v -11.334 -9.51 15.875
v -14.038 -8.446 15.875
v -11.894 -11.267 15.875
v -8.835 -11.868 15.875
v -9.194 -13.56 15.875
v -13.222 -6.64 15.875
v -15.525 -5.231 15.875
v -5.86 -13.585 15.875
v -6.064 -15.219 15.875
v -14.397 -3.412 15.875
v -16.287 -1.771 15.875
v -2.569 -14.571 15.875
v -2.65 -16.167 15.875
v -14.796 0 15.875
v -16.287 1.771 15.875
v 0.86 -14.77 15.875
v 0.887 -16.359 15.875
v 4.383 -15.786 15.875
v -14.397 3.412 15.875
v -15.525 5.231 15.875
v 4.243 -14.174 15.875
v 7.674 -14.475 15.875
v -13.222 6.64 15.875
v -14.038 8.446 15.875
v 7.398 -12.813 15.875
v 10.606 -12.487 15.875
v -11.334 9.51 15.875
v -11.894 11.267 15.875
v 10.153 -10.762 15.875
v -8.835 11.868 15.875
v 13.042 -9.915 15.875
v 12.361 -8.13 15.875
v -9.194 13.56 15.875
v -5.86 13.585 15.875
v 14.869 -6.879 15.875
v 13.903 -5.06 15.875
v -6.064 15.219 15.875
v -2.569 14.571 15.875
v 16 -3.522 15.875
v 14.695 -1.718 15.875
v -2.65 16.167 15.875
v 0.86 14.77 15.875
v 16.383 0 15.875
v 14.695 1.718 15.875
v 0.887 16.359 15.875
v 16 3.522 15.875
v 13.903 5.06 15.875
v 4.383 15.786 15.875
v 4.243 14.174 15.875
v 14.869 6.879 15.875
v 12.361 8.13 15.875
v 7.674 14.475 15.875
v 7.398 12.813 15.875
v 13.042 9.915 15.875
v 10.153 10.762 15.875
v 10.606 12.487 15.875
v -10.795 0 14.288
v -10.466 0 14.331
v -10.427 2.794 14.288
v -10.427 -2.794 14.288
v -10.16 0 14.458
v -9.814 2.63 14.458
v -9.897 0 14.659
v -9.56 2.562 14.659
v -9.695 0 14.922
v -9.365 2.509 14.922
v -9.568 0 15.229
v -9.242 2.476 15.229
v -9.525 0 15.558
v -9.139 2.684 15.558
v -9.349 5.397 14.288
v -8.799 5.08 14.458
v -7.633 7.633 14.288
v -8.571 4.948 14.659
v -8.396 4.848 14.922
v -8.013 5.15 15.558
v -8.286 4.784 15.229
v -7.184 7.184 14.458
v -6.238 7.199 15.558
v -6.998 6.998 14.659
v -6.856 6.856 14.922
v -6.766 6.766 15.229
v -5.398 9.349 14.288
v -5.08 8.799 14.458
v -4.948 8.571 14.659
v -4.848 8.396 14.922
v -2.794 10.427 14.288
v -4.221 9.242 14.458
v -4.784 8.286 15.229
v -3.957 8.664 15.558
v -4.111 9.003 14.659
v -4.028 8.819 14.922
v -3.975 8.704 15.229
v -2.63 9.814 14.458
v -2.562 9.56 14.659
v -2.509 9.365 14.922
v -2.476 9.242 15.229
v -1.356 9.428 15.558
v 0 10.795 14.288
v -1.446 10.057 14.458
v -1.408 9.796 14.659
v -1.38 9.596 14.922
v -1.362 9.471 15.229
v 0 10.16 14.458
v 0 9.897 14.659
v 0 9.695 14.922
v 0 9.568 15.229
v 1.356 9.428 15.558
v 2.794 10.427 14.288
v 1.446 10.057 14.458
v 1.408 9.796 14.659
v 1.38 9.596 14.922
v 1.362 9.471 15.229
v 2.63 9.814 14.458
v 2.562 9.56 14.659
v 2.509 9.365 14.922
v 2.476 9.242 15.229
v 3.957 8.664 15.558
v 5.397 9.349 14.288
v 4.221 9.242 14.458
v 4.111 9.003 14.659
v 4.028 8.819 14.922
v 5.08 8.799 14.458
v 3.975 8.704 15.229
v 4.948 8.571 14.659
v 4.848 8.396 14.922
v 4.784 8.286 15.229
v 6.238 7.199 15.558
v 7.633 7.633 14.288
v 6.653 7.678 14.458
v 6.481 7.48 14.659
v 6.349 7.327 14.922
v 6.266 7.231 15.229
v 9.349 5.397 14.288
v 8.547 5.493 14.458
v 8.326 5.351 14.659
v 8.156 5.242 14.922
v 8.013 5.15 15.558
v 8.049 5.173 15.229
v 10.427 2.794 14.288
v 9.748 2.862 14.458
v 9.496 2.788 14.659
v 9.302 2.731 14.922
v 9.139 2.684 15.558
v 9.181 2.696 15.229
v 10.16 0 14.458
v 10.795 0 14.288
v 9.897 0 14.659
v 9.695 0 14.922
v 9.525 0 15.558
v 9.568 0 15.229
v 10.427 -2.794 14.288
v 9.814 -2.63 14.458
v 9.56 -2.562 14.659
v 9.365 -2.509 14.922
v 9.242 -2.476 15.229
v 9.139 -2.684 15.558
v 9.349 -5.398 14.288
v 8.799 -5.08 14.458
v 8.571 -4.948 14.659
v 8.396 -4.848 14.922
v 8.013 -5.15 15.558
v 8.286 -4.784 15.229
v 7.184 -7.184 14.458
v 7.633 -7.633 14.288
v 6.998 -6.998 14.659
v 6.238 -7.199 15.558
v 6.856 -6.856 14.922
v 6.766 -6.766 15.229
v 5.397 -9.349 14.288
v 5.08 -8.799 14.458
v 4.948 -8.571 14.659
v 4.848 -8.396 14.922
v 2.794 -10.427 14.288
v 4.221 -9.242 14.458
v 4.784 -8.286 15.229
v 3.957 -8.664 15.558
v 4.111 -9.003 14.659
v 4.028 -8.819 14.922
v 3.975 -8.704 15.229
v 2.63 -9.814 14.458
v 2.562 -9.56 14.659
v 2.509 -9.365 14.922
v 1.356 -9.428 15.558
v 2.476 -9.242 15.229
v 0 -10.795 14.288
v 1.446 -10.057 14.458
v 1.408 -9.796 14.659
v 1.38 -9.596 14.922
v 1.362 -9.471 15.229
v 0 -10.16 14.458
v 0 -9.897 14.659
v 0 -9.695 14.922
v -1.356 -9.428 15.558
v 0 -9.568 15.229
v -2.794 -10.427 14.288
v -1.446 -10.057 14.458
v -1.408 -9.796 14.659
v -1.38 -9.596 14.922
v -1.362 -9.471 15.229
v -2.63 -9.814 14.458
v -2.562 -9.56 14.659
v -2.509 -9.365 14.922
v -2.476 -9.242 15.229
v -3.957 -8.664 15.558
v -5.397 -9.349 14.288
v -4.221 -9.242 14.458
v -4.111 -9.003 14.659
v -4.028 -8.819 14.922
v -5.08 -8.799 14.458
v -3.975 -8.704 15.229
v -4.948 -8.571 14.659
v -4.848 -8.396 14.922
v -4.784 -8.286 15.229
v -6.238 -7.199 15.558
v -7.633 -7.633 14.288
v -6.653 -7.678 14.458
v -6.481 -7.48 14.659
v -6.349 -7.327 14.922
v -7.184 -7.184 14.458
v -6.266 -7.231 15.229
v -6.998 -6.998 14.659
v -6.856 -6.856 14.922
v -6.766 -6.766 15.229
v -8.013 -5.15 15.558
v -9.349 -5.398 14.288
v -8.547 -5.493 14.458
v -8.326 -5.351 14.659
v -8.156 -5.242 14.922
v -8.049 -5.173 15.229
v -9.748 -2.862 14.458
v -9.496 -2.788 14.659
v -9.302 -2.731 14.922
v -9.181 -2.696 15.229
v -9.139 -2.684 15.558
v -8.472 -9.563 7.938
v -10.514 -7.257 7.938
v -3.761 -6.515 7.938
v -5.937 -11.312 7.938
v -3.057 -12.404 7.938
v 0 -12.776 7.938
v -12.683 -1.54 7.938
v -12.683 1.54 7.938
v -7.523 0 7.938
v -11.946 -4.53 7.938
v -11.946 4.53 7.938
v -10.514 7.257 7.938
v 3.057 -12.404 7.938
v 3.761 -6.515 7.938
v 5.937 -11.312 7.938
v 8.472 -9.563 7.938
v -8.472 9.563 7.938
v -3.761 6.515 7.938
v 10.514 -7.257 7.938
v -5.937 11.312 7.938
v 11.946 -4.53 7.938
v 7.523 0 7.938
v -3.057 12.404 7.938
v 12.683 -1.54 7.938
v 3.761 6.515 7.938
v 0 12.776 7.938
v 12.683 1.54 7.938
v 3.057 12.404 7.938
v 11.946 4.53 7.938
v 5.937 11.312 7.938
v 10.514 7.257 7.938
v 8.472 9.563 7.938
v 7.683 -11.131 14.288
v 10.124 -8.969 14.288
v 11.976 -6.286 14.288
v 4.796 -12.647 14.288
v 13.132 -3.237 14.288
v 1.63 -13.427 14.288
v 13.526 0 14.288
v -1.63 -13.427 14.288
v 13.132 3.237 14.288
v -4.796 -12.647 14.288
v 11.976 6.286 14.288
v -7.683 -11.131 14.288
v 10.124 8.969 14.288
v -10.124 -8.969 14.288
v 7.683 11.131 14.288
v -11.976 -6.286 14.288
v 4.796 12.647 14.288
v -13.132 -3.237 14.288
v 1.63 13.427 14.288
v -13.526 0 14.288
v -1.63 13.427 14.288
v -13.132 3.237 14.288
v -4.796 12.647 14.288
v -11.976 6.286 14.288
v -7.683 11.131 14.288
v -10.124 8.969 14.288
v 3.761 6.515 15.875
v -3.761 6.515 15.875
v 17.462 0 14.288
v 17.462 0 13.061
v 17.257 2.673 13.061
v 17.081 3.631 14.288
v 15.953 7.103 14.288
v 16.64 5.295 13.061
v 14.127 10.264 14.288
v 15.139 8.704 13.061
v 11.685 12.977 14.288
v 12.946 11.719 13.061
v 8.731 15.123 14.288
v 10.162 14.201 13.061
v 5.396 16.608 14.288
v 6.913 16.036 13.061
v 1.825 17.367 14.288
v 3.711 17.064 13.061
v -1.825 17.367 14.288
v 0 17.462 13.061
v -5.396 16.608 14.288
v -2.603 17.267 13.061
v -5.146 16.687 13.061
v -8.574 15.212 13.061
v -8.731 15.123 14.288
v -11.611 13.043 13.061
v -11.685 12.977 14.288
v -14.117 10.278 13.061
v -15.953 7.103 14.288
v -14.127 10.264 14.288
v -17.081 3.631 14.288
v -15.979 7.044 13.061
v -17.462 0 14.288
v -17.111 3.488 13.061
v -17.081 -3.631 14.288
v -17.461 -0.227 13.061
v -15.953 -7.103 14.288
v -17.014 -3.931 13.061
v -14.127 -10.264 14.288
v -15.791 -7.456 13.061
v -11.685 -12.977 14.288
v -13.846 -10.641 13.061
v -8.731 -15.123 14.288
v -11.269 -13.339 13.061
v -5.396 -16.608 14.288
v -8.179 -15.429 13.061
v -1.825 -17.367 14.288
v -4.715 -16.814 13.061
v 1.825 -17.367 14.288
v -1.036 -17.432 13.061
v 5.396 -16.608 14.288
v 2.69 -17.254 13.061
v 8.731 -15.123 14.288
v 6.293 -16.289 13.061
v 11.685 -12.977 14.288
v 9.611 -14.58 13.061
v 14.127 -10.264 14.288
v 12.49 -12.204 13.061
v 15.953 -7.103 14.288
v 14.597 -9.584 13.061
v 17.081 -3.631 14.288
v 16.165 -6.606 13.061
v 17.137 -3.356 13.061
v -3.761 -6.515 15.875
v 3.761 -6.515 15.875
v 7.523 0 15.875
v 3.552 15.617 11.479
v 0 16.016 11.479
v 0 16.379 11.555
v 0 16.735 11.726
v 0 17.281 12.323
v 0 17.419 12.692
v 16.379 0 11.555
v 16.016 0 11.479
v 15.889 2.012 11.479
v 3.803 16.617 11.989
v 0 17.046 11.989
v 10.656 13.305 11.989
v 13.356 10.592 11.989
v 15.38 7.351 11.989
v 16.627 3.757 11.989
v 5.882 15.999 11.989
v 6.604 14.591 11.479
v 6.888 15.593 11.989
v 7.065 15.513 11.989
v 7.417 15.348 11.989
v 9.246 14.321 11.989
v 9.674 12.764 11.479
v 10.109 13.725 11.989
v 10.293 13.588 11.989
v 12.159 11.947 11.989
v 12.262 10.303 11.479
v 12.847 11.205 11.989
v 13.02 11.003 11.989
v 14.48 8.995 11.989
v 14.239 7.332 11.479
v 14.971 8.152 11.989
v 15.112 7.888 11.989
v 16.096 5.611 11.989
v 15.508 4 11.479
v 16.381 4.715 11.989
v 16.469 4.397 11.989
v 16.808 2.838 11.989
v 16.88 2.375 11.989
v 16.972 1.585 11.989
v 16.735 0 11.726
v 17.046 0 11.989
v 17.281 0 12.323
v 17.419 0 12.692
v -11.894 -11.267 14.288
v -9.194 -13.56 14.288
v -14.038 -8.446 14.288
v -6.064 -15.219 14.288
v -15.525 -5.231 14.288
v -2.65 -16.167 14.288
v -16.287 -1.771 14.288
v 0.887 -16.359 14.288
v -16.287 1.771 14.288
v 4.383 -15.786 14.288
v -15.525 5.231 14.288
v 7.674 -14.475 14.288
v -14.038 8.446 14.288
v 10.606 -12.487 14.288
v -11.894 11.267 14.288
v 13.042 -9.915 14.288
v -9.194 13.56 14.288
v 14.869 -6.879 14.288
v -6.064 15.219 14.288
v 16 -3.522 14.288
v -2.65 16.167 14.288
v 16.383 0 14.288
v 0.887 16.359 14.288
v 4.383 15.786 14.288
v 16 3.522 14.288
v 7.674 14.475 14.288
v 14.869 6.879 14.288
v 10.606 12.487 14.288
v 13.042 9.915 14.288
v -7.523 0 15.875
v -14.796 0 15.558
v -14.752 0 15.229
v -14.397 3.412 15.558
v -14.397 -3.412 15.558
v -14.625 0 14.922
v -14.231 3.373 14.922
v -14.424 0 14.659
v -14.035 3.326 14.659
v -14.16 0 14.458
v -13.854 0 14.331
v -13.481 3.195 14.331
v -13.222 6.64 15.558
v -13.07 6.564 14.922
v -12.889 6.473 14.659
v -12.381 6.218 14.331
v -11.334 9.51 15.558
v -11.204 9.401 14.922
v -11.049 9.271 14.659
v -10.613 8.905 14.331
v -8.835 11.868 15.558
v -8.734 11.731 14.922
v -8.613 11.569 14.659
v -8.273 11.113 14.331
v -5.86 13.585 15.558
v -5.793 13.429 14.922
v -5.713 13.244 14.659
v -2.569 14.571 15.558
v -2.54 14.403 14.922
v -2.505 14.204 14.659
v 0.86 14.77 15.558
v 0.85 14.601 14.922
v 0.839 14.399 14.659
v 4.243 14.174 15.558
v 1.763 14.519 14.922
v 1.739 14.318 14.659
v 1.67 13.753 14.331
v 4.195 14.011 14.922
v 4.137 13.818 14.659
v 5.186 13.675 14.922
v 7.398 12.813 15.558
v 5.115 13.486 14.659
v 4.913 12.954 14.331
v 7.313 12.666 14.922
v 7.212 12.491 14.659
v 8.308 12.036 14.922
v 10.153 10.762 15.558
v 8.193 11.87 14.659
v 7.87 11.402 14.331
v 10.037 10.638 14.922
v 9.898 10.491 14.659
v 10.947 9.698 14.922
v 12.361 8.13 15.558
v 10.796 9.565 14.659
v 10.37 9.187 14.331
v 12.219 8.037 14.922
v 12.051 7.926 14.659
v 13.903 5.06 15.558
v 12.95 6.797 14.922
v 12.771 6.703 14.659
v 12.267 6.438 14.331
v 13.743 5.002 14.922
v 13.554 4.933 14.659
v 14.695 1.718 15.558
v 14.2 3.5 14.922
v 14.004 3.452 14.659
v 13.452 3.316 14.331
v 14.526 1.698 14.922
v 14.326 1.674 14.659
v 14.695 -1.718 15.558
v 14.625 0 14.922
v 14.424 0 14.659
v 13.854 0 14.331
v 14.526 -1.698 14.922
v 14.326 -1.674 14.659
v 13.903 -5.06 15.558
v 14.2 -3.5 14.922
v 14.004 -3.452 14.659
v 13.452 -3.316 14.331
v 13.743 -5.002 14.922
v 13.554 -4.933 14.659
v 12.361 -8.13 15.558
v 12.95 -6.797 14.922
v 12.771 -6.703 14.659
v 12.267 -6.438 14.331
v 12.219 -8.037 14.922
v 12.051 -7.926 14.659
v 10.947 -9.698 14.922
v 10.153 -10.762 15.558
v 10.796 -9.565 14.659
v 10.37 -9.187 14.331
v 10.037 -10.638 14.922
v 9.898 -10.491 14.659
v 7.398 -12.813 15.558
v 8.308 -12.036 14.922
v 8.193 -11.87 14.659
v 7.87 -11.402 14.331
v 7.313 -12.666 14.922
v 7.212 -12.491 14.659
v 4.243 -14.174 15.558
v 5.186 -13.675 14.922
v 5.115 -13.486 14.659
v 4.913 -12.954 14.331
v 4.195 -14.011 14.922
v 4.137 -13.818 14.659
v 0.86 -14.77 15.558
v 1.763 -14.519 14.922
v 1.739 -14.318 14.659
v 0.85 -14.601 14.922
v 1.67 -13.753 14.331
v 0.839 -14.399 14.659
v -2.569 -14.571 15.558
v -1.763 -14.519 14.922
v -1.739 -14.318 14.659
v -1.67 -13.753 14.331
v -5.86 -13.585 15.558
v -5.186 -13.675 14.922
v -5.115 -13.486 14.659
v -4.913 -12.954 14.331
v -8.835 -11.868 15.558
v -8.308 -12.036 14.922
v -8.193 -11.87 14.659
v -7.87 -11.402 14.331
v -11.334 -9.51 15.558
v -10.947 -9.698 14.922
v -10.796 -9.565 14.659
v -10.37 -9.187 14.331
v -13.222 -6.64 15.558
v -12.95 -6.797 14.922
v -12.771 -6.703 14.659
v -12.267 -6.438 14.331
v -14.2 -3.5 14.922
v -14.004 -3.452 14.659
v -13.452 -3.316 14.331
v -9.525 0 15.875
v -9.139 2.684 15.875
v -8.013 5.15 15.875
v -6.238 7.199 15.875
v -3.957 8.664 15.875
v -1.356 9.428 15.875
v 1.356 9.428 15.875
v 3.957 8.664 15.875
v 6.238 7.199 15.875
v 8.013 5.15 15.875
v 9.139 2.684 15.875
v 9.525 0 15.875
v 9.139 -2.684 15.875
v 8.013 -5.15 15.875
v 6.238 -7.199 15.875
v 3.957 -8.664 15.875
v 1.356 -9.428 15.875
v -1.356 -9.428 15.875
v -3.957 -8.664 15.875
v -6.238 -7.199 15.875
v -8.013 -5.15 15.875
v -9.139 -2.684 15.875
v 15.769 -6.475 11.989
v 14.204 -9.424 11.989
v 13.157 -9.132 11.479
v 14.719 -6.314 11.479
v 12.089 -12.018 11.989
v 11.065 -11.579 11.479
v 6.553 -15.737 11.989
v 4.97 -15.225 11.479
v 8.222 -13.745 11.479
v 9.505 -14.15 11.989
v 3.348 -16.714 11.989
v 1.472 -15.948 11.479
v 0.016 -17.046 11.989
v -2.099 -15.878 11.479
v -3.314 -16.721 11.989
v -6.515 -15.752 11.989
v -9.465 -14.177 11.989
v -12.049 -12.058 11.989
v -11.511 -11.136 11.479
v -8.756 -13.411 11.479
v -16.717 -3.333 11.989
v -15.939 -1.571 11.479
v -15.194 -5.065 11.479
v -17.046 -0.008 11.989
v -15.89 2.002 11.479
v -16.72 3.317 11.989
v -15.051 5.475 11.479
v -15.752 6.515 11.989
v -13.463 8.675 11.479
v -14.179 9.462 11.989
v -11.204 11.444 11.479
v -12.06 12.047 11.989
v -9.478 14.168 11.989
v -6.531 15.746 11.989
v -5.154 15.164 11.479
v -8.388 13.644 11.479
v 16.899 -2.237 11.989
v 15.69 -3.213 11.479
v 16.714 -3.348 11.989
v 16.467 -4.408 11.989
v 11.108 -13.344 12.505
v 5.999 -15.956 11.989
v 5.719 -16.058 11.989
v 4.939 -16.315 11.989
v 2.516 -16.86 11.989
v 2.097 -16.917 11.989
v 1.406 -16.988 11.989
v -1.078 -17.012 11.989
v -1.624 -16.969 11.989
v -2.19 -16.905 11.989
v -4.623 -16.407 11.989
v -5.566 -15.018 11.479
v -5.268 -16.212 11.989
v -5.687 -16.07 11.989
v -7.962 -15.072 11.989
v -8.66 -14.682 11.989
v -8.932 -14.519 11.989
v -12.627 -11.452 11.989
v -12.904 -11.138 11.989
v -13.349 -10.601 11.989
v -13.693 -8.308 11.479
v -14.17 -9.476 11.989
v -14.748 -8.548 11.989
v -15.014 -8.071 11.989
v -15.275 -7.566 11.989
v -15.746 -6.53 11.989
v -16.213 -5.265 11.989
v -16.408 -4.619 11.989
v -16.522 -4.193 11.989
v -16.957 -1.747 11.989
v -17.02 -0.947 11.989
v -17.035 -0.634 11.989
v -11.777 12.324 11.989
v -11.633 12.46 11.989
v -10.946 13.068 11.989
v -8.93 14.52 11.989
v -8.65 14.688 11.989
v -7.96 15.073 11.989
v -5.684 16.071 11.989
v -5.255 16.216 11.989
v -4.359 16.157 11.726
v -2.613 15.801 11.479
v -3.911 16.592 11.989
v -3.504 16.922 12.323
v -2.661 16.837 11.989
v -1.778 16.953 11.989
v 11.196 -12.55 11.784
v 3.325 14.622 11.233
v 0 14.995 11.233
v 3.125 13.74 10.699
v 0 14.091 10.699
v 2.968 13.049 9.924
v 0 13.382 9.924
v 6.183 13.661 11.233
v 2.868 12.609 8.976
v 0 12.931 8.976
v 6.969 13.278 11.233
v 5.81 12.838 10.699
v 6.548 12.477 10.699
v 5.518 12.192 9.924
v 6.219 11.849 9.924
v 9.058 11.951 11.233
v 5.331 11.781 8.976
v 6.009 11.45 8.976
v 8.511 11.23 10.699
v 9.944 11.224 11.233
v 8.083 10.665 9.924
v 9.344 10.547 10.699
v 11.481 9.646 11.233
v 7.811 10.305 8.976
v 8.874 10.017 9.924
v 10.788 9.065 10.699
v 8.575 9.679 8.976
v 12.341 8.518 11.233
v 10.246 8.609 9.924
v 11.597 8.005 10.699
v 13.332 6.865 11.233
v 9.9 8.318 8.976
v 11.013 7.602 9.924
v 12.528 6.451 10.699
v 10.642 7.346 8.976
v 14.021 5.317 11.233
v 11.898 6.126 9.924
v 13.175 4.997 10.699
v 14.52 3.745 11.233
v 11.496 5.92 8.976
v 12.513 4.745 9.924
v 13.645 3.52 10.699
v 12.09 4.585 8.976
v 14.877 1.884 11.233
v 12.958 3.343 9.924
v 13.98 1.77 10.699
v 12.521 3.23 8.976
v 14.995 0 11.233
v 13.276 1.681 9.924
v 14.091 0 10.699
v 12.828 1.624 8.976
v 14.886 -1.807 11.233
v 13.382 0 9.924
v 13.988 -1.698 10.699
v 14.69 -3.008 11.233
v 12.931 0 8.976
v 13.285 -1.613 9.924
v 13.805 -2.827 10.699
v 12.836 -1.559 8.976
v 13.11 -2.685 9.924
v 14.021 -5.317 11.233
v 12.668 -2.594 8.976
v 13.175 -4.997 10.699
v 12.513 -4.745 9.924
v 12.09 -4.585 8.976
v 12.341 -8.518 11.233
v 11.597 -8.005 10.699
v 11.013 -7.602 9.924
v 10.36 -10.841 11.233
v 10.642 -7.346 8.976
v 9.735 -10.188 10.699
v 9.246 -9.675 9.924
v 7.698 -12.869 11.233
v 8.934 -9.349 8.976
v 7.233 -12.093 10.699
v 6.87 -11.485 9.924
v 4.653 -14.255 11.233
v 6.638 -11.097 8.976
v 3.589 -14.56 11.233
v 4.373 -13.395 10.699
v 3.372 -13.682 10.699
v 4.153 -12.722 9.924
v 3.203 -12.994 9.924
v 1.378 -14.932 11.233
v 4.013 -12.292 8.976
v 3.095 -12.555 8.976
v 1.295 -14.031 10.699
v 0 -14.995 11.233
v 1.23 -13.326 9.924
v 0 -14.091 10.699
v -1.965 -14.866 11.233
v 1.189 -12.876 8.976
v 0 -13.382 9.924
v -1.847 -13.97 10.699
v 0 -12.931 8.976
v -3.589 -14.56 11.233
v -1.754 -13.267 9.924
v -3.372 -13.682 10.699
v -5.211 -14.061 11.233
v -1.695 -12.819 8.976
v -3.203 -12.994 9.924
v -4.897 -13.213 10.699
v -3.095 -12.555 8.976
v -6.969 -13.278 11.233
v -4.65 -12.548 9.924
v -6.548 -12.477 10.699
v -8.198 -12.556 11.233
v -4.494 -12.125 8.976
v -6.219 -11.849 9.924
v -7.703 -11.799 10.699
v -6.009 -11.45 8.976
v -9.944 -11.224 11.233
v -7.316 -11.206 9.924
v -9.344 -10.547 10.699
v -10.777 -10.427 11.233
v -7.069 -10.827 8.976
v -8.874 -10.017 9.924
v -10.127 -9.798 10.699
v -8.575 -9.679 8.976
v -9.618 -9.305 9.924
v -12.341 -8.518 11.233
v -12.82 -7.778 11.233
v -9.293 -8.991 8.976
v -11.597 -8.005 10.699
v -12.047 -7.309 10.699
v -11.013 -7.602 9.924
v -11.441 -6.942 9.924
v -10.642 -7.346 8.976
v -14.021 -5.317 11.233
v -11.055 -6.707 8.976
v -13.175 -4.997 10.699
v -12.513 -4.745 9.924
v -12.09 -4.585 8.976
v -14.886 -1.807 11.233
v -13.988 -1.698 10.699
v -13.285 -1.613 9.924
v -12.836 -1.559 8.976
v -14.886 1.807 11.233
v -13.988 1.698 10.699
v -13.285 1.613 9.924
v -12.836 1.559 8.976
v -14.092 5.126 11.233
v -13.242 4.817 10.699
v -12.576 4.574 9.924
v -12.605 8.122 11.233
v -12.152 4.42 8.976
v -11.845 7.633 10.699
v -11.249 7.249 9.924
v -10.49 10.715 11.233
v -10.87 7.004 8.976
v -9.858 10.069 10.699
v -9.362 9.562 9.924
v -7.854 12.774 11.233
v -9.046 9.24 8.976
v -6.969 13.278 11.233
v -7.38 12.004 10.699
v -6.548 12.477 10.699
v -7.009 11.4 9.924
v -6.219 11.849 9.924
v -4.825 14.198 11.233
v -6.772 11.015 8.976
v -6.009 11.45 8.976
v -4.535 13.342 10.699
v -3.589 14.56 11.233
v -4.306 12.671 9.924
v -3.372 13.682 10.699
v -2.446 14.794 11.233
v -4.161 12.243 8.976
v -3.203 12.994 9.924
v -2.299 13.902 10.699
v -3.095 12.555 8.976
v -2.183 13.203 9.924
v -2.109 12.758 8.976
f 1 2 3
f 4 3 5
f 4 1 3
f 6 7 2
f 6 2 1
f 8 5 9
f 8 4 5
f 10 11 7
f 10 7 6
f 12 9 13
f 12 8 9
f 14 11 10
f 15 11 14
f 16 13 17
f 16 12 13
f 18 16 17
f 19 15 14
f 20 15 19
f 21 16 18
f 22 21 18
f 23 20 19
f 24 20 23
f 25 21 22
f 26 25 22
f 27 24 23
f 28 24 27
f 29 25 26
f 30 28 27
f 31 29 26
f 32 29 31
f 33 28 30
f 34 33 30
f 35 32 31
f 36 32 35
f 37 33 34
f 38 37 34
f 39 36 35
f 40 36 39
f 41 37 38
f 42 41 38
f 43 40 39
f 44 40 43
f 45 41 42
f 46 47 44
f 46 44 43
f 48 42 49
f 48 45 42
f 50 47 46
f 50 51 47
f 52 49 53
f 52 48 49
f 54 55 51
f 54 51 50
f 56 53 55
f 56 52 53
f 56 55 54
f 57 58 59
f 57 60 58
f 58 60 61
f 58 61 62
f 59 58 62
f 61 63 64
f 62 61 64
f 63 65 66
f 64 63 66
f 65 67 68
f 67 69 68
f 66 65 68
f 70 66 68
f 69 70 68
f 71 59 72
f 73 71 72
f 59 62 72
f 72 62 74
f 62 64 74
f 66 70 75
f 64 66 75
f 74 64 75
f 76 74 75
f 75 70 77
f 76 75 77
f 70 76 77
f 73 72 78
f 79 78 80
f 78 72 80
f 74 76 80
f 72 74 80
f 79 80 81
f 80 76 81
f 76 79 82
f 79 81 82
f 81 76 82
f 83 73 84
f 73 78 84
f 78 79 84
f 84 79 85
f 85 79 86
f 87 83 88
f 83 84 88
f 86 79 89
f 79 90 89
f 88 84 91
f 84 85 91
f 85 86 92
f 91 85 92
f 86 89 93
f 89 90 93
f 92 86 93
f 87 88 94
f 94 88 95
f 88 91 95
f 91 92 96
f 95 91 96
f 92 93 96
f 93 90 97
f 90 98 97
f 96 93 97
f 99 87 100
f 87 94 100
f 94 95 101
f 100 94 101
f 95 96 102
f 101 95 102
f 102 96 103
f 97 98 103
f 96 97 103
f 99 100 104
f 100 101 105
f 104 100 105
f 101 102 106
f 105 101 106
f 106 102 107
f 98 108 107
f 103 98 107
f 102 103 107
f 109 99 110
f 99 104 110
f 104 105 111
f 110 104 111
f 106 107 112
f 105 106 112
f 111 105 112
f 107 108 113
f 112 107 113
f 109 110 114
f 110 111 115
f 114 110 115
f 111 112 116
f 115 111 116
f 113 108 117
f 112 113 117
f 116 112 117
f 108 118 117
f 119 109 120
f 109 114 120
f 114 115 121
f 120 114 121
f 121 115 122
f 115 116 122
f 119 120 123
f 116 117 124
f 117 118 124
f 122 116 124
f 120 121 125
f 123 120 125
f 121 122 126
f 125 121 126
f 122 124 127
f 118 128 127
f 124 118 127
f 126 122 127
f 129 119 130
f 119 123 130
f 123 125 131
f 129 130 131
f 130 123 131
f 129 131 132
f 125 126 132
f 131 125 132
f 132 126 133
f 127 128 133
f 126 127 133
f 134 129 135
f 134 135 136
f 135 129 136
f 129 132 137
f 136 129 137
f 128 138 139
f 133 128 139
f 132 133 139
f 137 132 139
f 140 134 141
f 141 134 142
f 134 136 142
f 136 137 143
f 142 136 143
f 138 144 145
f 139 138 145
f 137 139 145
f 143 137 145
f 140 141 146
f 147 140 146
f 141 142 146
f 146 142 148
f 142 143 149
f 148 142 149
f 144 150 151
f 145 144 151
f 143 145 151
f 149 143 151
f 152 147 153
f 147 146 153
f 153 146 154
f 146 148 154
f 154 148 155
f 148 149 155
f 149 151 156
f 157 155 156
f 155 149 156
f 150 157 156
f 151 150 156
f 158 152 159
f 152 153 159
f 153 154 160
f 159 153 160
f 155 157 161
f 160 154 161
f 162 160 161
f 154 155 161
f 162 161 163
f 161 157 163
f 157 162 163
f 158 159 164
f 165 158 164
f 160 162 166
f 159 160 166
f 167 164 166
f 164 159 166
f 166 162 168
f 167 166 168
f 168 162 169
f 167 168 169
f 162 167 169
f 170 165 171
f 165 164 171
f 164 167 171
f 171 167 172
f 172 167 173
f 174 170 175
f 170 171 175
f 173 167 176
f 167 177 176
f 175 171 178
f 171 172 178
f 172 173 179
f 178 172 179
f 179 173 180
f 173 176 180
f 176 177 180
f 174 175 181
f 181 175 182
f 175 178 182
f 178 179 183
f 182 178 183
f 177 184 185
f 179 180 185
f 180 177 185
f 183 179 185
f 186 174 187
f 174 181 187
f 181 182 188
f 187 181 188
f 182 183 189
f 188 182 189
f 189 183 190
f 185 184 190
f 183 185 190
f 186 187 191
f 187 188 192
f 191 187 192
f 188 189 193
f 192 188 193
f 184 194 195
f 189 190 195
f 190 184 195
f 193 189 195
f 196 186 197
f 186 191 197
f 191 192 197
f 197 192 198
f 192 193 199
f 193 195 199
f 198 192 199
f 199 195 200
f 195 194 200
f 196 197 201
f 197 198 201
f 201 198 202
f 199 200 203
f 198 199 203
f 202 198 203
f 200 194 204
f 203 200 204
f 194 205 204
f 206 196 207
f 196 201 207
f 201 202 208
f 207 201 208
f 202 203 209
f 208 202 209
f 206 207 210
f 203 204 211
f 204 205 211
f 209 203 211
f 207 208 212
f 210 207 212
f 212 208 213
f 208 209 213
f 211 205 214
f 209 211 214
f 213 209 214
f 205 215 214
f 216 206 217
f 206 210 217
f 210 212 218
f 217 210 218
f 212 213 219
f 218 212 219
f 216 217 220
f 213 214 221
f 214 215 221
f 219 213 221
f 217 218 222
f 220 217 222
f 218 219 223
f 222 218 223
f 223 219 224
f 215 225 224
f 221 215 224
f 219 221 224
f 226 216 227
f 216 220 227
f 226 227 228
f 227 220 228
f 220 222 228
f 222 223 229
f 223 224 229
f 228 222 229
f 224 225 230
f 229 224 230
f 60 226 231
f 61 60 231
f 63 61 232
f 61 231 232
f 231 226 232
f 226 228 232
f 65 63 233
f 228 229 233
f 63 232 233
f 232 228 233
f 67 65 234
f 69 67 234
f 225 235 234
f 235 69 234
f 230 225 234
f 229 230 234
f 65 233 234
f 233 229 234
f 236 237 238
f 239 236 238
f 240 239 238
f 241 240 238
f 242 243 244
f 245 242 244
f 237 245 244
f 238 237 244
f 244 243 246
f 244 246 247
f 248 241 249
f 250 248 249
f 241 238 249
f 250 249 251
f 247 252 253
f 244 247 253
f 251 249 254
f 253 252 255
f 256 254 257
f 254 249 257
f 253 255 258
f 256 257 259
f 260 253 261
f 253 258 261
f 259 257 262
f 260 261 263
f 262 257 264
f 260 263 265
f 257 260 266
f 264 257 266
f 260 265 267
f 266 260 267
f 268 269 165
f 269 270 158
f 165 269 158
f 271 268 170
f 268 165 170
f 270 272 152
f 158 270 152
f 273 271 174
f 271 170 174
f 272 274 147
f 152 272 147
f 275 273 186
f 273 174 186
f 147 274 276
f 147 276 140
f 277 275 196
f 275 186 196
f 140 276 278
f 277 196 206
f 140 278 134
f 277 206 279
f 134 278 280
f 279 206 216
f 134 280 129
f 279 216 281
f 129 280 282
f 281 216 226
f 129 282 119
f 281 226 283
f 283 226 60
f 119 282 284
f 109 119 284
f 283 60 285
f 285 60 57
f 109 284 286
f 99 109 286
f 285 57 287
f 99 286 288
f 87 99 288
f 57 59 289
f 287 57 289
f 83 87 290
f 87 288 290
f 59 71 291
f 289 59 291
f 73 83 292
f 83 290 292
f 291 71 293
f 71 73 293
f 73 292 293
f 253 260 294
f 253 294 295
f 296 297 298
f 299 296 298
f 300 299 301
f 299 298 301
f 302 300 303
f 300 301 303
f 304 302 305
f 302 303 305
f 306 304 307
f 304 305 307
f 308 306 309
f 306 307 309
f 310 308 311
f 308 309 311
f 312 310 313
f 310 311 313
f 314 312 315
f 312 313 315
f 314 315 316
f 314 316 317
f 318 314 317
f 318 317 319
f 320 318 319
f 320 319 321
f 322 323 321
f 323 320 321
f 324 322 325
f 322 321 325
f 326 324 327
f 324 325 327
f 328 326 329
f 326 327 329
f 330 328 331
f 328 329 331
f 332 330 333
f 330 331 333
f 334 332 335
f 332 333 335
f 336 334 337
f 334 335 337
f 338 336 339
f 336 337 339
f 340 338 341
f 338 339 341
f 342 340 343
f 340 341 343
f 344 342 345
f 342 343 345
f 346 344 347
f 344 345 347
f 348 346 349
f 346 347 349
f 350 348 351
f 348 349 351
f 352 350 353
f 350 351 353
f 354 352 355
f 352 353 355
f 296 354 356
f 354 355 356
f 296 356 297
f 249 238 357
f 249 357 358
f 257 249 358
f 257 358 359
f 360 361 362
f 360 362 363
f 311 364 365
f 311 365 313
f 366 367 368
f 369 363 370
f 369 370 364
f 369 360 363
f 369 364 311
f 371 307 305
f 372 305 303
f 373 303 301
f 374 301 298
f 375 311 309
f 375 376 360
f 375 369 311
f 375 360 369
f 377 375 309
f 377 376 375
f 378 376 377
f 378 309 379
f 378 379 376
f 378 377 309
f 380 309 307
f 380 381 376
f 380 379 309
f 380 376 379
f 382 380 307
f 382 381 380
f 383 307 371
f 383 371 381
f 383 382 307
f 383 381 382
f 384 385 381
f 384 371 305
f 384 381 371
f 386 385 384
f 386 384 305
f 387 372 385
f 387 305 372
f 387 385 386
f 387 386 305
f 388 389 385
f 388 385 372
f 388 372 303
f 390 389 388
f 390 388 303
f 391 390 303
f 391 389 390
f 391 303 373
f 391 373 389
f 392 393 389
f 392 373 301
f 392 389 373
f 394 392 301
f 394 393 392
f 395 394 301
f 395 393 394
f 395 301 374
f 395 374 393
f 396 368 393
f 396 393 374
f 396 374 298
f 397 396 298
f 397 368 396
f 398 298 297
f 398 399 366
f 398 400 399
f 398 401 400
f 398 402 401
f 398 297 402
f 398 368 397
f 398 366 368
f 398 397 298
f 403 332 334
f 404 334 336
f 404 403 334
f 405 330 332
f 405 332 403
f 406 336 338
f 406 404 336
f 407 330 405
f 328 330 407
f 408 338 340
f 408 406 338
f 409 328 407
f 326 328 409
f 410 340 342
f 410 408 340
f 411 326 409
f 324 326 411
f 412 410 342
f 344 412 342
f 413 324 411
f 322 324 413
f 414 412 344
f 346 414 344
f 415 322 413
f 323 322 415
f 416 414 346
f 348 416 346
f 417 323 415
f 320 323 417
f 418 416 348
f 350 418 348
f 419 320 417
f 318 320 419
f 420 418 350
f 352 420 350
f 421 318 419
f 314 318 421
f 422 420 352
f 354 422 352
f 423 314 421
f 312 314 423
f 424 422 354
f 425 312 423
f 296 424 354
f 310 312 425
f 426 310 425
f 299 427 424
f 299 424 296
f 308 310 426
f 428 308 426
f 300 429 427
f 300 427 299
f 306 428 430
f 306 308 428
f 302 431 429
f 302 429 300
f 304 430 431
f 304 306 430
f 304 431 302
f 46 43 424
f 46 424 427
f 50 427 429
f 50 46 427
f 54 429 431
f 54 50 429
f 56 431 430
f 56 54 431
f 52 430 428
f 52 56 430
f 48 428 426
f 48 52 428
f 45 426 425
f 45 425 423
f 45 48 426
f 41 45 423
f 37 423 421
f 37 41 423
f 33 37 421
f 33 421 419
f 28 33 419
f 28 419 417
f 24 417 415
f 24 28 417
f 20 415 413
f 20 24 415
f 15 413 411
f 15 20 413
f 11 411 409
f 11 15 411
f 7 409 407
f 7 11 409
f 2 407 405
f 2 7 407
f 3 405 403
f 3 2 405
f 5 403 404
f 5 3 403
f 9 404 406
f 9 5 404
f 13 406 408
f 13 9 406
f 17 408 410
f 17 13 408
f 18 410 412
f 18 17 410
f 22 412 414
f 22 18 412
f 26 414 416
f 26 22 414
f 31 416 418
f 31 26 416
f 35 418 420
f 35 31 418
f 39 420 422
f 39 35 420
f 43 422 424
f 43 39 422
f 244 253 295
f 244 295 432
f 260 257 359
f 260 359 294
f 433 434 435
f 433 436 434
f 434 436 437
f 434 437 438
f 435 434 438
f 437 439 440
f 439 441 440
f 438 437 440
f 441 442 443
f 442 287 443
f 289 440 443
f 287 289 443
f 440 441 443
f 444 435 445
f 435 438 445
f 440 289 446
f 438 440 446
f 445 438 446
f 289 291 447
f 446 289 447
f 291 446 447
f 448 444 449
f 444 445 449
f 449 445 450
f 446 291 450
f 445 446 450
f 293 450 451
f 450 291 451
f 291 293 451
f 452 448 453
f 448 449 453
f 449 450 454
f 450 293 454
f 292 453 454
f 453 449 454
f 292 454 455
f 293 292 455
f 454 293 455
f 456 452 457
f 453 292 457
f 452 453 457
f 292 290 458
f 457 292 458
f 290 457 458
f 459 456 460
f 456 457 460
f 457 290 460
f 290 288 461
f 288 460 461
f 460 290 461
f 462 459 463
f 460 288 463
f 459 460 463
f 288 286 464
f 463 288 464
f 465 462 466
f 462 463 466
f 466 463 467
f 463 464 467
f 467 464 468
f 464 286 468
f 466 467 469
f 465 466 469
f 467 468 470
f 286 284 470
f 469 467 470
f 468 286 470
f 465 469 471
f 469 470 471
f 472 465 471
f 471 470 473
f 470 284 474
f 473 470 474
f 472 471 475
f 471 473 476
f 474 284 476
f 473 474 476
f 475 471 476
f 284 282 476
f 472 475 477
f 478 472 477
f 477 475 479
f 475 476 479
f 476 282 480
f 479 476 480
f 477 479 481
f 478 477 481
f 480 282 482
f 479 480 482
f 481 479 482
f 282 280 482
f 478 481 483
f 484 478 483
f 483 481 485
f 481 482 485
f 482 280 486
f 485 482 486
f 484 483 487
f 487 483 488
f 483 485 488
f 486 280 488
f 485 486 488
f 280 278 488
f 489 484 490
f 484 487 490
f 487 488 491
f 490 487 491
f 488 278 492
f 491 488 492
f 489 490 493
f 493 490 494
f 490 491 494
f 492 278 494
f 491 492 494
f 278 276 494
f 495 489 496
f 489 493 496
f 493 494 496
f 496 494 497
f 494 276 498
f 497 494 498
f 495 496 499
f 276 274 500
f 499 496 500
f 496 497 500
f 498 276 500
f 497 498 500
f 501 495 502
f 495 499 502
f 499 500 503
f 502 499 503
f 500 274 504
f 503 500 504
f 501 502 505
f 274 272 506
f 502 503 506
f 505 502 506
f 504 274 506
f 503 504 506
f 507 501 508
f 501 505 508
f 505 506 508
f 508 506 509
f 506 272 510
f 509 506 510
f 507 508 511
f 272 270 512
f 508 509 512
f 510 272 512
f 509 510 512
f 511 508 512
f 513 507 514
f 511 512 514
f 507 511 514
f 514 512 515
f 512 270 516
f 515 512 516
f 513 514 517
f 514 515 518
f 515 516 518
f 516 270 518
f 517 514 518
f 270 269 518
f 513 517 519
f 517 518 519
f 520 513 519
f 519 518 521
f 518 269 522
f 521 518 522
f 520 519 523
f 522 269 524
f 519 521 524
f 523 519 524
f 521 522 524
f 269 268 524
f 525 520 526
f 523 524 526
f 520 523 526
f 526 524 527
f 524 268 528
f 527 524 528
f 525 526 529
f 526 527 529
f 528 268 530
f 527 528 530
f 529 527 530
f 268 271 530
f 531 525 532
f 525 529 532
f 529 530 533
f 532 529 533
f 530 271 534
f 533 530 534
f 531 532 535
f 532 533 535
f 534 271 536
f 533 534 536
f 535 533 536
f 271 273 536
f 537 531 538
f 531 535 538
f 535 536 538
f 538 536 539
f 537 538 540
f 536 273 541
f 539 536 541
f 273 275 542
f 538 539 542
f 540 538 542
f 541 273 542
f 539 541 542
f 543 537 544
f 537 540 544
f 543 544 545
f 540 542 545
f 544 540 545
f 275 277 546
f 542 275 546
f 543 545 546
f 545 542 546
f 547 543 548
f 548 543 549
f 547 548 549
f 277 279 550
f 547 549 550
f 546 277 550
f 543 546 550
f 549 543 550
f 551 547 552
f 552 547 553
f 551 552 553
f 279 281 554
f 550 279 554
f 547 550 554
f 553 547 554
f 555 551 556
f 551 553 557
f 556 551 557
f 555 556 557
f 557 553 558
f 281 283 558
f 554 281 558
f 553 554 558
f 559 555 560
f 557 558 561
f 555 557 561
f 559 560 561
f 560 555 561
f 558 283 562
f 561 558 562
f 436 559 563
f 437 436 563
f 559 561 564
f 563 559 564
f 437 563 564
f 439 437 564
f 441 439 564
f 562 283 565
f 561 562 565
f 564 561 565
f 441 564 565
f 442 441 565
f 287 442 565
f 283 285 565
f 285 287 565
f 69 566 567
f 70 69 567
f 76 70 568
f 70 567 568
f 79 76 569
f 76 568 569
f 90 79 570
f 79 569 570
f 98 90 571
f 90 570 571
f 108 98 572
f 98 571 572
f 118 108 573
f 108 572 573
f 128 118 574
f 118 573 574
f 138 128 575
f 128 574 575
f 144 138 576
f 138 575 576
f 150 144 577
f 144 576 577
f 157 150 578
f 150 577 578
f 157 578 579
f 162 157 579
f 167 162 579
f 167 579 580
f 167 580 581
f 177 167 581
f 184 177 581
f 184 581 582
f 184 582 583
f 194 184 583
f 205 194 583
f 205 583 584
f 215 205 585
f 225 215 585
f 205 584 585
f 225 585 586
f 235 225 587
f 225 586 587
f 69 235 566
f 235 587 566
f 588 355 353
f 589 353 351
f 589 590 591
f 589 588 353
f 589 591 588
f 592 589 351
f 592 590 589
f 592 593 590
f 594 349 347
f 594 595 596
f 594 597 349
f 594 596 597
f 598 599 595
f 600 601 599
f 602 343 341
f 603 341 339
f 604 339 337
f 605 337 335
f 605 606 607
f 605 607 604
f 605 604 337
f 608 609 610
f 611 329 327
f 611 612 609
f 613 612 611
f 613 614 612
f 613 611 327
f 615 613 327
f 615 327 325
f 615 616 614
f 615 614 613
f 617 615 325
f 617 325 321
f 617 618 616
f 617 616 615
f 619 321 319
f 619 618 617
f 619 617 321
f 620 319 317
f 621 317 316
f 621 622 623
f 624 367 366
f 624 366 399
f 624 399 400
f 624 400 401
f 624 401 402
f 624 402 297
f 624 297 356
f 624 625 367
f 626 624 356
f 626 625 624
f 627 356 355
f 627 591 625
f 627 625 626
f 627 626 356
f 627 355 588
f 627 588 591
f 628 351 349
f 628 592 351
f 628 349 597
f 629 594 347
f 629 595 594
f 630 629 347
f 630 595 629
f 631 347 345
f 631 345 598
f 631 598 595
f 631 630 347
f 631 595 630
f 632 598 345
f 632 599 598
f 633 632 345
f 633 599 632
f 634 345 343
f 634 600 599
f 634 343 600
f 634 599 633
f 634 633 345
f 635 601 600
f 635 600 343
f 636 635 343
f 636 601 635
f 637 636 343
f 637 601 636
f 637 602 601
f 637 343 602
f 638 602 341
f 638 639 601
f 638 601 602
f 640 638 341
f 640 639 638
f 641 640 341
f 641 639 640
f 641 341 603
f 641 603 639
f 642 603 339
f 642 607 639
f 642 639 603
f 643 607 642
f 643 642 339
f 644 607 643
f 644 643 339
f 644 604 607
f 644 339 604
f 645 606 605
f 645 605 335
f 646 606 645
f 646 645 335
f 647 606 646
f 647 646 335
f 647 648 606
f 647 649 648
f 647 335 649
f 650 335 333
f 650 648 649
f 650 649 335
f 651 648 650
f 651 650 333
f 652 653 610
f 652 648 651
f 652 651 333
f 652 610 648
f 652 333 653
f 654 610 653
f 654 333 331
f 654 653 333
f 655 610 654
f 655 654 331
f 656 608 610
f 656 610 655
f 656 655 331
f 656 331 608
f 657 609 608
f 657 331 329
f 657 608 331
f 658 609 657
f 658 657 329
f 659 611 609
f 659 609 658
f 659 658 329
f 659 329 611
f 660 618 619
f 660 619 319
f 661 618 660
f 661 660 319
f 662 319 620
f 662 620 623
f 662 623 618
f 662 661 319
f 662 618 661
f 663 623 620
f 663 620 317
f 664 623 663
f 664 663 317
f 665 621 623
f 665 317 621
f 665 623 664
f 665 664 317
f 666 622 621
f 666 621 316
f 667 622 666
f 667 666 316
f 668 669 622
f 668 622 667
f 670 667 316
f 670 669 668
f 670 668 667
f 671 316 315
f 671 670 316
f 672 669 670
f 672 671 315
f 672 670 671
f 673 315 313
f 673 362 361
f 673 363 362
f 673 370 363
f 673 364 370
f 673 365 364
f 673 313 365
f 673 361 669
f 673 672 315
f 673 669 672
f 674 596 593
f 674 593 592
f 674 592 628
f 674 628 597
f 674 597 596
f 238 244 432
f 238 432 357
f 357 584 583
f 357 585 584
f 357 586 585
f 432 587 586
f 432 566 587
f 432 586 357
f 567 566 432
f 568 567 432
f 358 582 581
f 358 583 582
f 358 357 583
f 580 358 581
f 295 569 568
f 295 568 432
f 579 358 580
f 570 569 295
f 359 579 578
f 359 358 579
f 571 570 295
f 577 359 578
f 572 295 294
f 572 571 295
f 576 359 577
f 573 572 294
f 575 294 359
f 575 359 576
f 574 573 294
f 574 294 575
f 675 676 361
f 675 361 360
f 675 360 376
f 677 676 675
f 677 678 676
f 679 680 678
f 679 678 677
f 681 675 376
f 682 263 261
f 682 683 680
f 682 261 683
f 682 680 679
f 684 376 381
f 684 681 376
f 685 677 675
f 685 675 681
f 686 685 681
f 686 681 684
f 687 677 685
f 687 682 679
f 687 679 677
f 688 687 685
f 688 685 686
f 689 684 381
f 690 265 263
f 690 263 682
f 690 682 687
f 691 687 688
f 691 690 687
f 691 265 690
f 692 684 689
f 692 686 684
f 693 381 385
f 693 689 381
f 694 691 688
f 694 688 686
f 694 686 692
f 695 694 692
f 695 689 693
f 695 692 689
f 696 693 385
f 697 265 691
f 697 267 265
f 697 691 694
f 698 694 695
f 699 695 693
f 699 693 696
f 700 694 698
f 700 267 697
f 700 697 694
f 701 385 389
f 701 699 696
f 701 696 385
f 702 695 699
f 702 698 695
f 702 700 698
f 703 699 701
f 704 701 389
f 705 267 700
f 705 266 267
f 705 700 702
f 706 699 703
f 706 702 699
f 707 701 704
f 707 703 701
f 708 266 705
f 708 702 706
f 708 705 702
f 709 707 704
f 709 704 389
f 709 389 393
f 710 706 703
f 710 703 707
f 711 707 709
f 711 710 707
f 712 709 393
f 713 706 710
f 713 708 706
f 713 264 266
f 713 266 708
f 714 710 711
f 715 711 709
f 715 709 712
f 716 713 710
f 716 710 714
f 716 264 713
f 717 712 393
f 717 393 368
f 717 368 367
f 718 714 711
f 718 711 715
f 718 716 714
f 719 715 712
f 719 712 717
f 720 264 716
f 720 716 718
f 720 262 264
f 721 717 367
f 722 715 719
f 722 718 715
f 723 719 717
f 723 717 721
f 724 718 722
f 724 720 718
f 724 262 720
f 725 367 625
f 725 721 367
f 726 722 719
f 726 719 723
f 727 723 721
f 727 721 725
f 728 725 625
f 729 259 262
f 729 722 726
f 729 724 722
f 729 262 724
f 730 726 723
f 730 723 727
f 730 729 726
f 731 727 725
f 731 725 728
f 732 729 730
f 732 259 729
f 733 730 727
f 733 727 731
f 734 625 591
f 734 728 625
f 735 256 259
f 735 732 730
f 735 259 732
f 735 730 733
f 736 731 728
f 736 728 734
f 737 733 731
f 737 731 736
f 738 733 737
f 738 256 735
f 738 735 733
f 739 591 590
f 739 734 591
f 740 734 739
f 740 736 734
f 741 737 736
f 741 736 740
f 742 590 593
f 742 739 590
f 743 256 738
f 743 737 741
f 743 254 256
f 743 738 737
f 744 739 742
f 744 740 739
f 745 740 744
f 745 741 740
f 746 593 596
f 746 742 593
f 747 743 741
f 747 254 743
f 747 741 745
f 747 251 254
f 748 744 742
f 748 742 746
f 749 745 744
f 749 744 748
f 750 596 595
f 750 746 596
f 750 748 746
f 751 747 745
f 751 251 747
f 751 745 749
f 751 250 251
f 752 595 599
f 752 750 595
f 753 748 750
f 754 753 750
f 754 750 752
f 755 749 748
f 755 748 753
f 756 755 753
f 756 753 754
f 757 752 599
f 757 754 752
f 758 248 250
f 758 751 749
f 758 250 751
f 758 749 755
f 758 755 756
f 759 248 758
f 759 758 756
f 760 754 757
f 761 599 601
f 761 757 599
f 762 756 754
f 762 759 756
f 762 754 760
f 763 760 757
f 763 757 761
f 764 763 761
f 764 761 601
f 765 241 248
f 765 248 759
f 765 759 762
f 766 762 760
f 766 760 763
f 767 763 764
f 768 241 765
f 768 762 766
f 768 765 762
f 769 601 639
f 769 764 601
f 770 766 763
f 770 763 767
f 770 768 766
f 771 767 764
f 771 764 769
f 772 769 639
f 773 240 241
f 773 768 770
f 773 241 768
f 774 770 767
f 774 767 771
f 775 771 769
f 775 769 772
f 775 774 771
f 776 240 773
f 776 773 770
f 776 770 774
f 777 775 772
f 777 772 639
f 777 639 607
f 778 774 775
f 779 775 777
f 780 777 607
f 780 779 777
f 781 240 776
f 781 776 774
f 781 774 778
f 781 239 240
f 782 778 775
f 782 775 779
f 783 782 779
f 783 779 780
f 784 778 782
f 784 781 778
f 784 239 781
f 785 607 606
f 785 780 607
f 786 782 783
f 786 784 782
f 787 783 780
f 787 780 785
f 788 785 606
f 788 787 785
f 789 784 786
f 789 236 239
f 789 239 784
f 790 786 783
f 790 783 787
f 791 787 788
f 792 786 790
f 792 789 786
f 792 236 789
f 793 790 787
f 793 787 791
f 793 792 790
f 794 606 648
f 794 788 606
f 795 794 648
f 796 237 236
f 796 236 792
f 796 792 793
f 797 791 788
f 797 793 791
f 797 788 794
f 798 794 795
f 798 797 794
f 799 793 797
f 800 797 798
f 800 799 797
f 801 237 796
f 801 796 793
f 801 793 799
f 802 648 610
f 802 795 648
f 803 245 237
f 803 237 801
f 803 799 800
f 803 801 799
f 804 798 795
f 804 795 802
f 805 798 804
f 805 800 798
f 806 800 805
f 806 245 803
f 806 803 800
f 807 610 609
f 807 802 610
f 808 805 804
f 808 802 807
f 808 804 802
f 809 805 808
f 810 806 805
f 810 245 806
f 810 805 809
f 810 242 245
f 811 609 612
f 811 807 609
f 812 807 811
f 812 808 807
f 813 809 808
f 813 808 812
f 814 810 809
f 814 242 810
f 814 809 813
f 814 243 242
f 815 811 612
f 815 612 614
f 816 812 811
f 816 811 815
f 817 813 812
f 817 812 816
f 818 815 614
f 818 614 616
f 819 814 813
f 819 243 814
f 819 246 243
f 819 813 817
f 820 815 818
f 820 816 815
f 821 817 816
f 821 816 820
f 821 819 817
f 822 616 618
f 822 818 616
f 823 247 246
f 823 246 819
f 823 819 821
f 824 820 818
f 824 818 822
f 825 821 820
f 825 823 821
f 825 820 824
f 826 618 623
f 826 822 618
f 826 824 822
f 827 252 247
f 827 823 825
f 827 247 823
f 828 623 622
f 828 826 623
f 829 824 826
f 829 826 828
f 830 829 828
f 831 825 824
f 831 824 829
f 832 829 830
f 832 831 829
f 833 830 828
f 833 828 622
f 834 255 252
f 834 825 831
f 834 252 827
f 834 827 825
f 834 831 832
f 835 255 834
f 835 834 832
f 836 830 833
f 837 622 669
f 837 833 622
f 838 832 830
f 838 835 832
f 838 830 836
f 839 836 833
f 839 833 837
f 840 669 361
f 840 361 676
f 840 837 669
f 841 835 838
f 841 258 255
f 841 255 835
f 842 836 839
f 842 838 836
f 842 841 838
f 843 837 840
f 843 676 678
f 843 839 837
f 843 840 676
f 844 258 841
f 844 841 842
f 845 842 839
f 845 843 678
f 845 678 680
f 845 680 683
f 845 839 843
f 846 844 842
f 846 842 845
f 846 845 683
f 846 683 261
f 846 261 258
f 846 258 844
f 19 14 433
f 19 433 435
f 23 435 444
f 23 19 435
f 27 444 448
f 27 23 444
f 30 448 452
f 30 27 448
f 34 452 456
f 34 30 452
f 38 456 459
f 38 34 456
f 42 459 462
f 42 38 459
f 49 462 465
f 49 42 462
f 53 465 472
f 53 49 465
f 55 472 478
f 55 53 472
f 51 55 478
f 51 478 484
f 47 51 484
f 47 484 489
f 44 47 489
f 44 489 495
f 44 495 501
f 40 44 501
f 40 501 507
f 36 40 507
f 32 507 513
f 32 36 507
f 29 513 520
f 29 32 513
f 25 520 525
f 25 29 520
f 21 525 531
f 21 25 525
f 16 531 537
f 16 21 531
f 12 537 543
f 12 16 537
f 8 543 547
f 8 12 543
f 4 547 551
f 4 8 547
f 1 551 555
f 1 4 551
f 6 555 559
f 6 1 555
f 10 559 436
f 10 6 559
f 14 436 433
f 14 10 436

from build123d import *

# Parameters (mm, degrees)
SKETCH1_R                         = 17.4625
HEX_AXEL_CUTOUT_OUTSIDE_RIM_DEPTH = 15.875
SKETCH3_R                         = 19.05
SKETCH3_R_2                       = 16.383
PIPE_STEP_DEPTH                   = 1.5875
SKETCH5_R                         = 14.7955
SKETCH5_R_2                       = 9.525
SPOKE_STEP_DEPTH                  = 1.5875
FILLET1_R                         = 1.27
FILLET2_R                         = 1.5875
SKETCH7_W                         = 50.409195303
SKETCH7_H                         = 73.287011446
MIDCUT_DEPTH                      = 8.9375


with BuildPart() as part:
    # Sketch1 → Hex Axel Cutout & Outside Rim (new body)
    with BuildSketch(Plane.XY):
        Circle(SKETCH1_R)
        Polygon((-7.522989478, 0), (-3.761494739, -6.5151), (3.761494739, -6.5151), (7.522989478, 0), (3.761494739, 6.5151), (-3.761494739, 6.5151), align=None, mode=Mode.SUBTRACT)
    extrude(amount=HEX_AXEL_CUTOUT_OUTSIDE_RIM_DEPTH)

    # Sketch3 → Pipe Step (cut)
    with BuildSketch(Plane.XY.offset(15.875)):
        Circle(SKETCH3_R)
        Circle(SKETCH3_R_2, mode=Mode.SUBTRACT)
    pipe_step = extrude(amount=-PIPE_STEP_DEPTH, mode=Mode.SUBTRACT)

    # Step Mirror: Pipe Step across plane
    add(pipe_step.mirror(Plane.XY.offset(7.9375)), mode=Mode.SUBTRACT)

    # Sketch4 → Poly Cord Groove (revolve, cut)
    with BuildSketch(Plane(origin=(0, 0, 0), x_dir=(0, 0, -1), z_dir=(1, 0, 0))):
        with BuildLine():
            Line((-4.3815, 16.331738244), (-4.3815, 17.4625))
            Line((-4.3815, 17.4625), (-11.4935, 17.4625))
            Line((-11.4935, 17.4625), (-11.4935, 16.331738244))
            ThreePointArc((-11.4935, 16.331738244), (-7.9375, 12.775738244), (-4.3815, 16.331738244))
        make_face()
    revolve(axis=Axis((0, 0, 14.2875), (0, 0, -1)), mode=Mode.SUBTRACT)

    # Sketch5 → Spoke Step (cut)
    with BuildSketch(Plane(origin=(0, 0, 0), x_dir=(-1, 0, 0), z_dir=(0, 0, -1))):
        Circle(SKETCH5_R)
        Circle(SKETCH5_R_2, mode=Mode.SUBTRACT)
    spoke_step = extrude(amount=-SPOKE_STEP_DEPTH, mode=Mode.SUBTRACT)

    # Spoke Step Mirror: Spoke Step across plane
    add(spoke_step.mirror(Plane.XY.offset(7.9375)), mode=Mode.SUBTRACT)

    # Fillet1
    fillet1_edges = [part.edges().sort_by_distance(p)[0] for p in [
        (14.7955, 0, 1.5875),
        (9.525, 0, 1.5875),
        (14.7955, 0, 14.2875),
        (9.525, 0, 14.2875),
    ]]
    fillet(fillet1_edges, radius=FILLET1_R)

    # Fillet2
    fillet2_edges = [part.edges().sort_by_distance(p)[0] for p in [
        (-17.4625, 0, 4.3815),
        (-17.4625, 0, 11.4935),
    ]]
    fillet(fillet2_edges, radius=FILLET2_R)

    # Sketch7 → MidCut (cut, through all)
    with BuildSketch(Plane.XY.offset(7.9375)):
        with Locations((-1.207308933, -3.38321392)):
            Rectangle(SKETCH7_W, SKETCH7_H)
    extrude(amount=-MIDCUT_DEPTH, mode=Mode.SUBTRACT)


solid = part.part
